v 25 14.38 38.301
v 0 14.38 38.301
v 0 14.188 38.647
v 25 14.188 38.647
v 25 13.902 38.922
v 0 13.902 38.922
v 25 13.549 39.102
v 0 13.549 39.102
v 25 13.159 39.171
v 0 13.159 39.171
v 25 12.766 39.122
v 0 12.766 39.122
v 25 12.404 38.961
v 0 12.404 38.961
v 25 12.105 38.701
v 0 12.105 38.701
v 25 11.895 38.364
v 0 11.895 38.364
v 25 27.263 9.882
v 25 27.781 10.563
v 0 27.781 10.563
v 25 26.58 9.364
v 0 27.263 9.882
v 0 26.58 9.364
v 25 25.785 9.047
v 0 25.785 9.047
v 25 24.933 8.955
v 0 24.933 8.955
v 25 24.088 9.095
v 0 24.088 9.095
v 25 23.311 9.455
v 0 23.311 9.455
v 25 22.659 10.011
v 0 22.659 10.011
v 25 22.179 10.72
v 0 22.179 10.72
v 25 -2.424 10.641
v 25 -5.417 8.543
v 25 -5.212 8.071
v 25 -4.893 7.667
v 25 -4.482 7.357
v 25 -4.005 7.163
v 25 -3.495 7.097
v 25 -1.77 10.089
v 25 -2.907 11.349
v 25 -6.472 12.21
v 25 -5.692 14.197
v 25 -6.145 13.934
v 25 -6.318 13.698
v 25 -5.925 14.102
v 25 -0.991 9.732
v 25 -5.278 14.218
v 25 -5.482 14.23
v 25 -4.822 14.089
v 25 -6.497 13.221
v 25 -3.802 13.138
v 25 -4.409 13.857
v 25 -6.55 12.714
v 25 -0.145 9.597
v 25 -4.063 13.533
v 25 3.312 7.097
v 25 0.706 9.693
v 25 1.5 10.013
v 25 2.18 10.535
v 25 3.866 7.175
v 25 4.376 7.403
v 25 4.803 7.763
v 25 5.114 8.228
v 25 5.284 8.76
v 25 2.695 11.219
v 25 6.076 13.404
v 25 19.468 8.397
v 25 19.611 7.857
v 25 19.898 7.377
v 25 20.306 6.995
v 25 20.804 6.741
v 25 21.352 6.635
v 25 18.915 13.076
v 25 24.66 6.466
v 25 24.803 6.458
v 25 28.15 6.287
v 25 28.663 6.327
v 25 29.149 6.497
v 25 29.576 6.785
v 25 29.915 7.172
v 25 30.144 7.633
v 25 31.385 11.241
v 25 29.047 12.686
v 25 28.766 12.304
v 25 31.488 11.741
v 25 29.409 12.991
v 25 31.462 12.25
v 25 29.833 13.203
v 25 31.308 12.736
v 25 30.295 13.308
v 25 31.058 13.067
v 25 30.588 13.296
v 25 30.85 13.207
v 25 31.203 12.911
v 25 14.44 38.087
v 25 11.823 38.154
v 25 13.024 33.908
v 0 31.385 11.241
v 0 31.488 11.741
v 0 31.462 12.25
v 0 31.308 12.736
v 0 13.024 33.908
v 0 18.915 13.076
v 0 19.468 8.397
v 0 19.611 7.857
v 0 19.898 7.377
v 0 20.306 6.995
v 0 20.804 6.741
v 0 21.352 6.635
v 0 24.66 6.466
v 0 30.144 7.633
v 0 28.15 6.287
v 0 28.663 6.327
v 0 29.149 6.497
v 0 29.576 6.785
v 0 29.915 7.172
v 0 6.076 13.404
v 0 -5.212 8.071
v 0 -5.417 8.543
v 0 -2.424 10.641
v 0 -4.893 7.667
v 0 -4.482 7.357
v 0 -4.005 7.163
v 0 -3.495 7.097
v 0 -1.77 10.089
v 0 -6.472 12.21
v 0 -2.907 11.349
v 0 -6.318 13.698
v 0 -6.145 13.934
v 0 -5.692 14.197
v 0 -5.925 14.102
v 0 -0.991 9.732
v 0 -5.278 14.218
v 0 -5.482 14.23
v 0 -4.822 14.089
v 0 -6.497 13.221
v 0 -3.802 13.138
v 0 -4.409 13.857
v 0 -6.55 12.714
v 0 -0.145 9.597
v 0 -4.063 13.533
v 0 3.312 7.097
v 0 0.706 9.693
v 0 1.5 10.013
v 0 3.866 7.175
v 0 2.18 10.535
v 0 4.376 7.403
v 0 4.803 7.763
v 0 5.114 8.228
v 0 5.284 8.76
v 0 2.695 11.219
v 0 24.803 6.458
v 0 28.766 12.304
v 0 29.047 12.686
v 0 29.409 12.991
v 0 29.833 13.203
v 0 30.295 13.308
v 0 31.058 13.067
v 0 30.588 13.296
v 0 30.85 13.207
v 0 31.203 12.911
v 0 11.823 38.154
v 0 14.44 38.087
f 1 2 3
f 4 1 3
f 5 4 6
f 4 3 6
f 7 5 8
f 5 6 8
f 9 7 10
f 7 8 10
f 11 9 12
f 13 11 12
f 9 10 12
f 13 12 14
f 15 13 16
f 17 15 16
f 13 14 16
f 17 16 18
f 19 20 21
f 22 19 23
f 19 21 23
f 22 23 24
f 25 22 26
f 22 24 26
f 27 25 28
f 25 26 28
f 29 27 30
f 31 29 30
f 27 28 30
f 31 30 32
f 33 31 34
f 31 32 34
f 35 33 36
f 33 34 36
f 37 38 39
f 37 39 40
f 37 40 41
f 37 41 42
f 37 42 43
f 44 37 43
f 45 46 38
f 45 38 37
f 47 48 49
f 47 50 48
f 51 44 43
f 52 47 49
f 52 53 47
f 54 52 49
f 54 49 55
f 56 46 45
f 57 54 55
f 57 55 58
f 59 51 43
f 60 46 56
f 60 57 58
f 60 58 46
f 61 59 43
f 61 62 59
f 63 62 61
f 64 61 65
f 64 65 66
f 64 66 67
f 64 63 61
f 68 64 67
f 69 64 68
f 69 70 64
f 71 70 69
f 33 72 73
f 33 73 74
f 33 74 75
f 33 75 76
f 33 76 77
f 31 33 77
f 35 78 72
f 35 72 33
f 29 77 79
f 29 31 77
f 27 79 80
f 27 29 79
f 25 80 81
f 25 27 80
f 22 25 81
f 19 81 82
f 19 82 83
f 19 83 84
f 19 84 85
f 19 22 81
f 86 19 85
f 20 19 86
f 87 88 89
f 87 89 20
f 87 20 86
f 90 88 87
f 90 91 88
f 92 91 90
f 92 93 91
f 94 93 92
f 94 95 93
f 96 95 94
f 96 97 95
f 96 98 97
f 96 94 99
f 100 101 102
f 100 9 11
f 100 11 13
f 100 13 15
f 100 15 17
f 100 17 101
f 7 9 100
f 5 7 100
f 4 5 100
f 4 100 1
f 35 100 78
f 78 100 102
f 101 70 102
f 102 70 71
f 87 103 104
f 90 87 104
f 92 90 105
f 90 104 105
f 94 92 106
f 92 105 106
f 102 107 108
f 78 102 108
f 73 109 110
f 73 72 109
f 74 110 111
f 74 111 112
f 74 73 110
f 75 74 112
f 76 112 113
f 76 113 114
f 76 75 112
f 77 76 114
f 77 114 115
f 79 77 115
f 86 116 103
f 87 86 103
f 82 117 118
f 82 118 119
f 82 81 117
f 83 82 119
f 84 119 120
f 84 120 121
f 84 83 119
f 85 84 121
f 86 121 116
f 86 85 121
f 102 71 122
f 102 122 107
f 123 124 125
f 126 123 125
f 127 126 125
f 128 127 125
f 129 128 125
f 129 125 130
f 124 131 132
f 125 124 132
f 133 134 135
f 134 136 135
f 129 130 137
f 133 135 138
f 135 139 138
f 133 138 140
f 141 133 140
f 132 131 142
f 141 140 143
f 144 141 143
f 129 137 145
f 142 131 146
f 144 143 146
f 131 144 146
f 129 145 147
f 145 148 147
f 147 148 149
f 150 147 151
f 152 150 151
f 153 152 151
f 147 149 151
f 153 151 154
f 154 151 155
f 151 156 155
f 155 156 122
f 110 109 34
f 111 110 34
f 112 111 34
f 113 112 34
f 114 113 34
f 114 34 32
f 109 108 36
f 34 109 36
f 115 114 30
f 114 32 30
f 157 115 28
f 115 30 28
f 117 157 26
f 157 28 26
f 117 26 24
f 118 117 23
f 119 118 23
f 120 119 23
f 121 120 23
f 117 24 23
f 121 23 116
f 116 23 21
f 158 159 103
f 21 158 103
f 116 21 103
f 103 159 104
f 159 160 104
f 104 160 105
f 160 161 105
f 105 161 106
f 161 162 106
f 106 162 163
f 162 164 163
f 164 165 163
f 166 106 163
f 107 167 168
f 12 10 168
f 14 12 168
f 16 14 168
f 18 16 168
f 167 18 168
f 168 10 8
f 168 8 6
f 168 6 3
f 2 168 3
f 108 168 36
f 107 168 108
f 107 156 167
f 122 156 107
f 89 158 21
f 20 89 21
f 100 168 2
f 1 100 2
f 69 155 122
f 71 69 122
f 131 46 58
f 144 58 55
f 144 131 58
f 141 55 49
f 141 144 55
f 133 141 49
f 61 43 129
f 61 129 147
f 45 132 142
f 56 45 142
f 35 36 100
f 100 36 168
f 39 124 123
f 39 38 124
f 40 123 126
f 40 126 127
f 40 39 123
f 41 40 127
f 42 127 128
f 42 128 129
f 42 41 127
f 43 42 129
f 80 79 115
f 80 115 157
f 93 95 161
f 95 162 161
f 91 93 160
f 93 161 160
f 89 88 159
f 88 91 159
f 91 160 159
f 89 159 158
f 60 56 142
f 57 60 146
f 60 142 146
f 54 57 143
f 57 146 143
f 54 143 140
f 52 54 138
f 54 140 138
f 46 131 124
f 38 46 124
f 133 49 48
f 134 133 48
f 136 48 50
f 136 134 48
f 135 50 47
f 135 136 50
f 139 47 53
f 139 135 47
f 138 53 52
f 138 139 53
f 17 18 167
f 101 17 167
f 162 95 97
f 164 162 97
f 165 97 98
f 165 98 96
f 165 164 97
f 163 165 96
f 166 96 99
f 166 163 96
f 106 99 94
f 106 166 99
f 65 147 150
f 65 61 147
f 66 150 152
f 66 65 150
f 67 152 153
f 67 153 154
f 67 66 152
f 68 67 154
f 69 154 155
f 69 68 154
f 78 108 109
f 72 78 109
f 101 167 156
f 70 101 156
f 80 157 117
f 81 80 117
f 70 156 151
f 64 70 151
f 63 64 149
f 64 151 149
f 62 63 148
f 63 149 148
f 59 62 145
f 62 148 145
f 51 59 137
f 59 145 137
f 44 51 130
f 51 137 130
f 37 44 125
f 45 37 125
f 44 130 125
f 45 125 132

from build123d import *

# Parameters (mm, degrees)
F1_DEPTH    = 25
F2_T1_DEPTH = 35
F2_T3_DEPTH = 33.3163528131
F3_R        = 1
F4_R        = 2


# Not quite as in the source:
# - a fillet or chamfer that OpenCascade refuses, or shapes differently, is made with other operations: its cross-section is extruded or revolved along the edge and cut away or added


with BuildPart() as f1:
    # F0 (on Right) → F1 (new body)
    with BuildSketch(Plane.YZ):
        with BuildLine():
            Line((-6.9323359057, 13.8083724305), (-5, 7.0966093383))
            Line((-5, 7.0966093383), (-0.1434815237, 7.0966093383))
            ThreePointArc((-0.1434815237, 7.0966093383), (-3.0832893136, 7.9619770163), (-5.1434815237, 10.2306636665))
            Line((-5.1434815237, 10.2306636665), (-6.9323359057, 13.8083724305))
        make_face()
        with BuildLine():
            ThreePointArc((-5.1434815237, 10.2306636665), (-3.0832893136, 7.9619770163), (-0.1434815237, 7.0966093383))
            Line((-0.1434815237, 7.0966093383), (0, 7.0966093383))
            ThreePointArc((0, 7.0966093383), (2.9398077898, 7.9619770163), (5, 10.2306636665))
            Line((5, 10.2306636665), (6.0755903162, 13.4044619593))
            Line((6.0755903162, 13.4044619593), (13.0241518458, 33.9079309741))
            Line((13.0241518458, 33.9079309741), (11.8234508953, 38.1539476614))
            Line((11.8234508953, 38.1539476614), (2.6952738362, 11.2189777838))
            ThreePointArc((2.6952738362, 11.2189777838), (-0.1451253509, 9.597004922), (-2.9074135462, 11.3486976553))
            Line((-2.9074135462, 11.3486976553), (-4.6962679282, 14.9264064193))
            Line((-4.6962679282, 14.9264064193), (-6.9323359057, 13.8083724305))
            Line((-6.9323359057, 13.8083724305), (-5.1434815237, 10.2306636665))
        make_face()
        with BuildLine():
            ThreePointArc((5, 10.2306636665), (2.9398077898, 7.9619770163), (0, 7.0966093383))
            Line((0, 7.0966093383), (5, 7.0966093383))
            Line((5, 7.0966093383), (6.0755903162, 13.4044619593))
            Line((6.0755903162, 13.4044619593), (5, 10.2306636665))
        make_face()
        with BuildLine():
            Line((11.8234508953, 38.1539476614), (13.0241518458, 33.9079309741))
            Line((13.0241518458, 33.9079309741), (14.4404213471, 38.0869884254))
            Line((14.4404213471, 38.0869884254), (14.3799488187, 38.3008363155))
            ThreePointArc((14.3799488187, 38.3008363155), (13.1588056017, 39.1706090028), (11.8947803947, 38.3644231928))
            Line((11.8947803947, 38.3644231928), (11.8234508953, 38.1539476614))
        make_face()
        with BuildLine():
            Line((14.4404213471, 38.0869884254), (13.0241518458, 33.9079309741))
            Line((13.0241518458, 33.9079309741), (18.9150818034, 13.075943714))
            Line((18.9150818034, 13.075943714), (19.8269579074, 9.8512930193))
            ThreePointArc((19.8269579074, 9.8512930193), (21.7684346268, 7.4802174812), (24.6601411506, 6.4656414912))
            Line((24.6601411506, 6.4656414912), (24.8034349308, 6.4583039016))
            ThreePointArc((24.8034349308, 6.4583039016), (27.7836505914, 7.1721986247), (29.9571668266, 9.332559297))
            Line((29.9571668266, 9.332559297), (31.9266431601, 12.8141053576))
            Line((31.9266431601, 12.8141053576), (29.7506768723, 14.045028066))
            Line((29.7506768723, 14.045028066), (27.7812005388, 10.5634820055))
            ThreePointArc((27.7812005388, 10.5634820055), (24.9329458702, 8.9553436878), (22.1792103708, 10.7204511366))
            Line((22.1792103708, 10.7204511366), (14.4404213471, 38.0869884254))
        make_face()
        with BuildLine():
            Line((19.8269579074, 9.8512930193), (18.9150818034, 13.075943714))
            Line((18.9150818034, 13.075943714), (19.6666835811, 6.7213395575))
            Line((19.6666835811, 6.7213395575), (24.6601411506, 6.4656414912))
            ThreePointArc((24.6601411506, 6.4656414912), (21.7684346268, 7.4802174812), (19.8269579074, 9.8512930193))
        make_face()
        with BuildLine():
            ThreePointArc((29.9571668266, 9.332559297), (27.7836505914, 7.1721986247), (24.8034349308, 6.4583039016))
            Line((24.8034349308, 6.4583039016), (29.6535987202, 6.2099434249))
            Line((29.6535987202, 6.2099434249), (31.9266431601, 12.8141053576))
            Line((31.9266431601, 12.8141053576), (29.9571668266, 9.332559297))
        make_face()
    extrude(amount=F1_DEPTH)

    # F2: fillet of radius 2 on 4 edges, made by hand

    # F2_s2 → F2_t1 (cut)
    with BuildSketch(Plane.YZ.offset(-5)):
        with BuildLine():
            ThreePointArc((-3.8018407372, 13.1375520373), (-4.9582395872, 14.1404914424), (-6.4851223102, 14.0319792283))
            Line((-6.4851223102, 14.0319792283), (-4.6962679282, 14.9264064193))
            Line((-4.6962679282, 14.9264064193), (-3.8018407372, 13.1375520373))
        make_face()
        with BuildLine():
            ThreePointArc((31.4914499025, 13.0602898993), (29.972114357, 13.2467443186), (28.7659387055, 12.3042550357))
            Line((28.7659387055, 12.3042550357), (29.7506768723, 14.045028066))
            Line((29.7506768723, 14.045028066), (31.4914499025, 13.0602898993))
        make_face()
    extrude(amount=F2_T1_DEPTH, mode=Mode.SUBTRACT)

    # F2_s4 → F2_t3 (cut)
    with BuildSketch(Plane.YZ.offset(-4.1581764065)):
        with BuildLine():
            ThreePointArc((-6.4721671557, 12.2100252573), (-6.3817440303, 13.5668302715), (-5.4446614885, 14.5522096391))
            Line((-5.4446614885, 14.5522096391), (-6.9323359057, 13.8083724305))
            Line((-6.9323359057, 13.8083724305), (-6.4721671557, 12.2100252573))
        make_face()
        with BuildLine():
            ThreePointArc((31.3853376782, 11.2413824514), (31.3644193539, 12.6010363088), (30.4789548914, 13.6330483599))
            Line((30.4789548914, 13.6330483599), (31.9266431601, 12.8141053576))
            Line((31.9266431601, 12.8141053576), (31.3853376782, 11.2413824514))
        make_face()
    extrude(amount=F2_T3_DEPTH, mode=Mode.SUBTRACT)

    # F3
    f3_edges = [f1.edges().sort_by_distance(p)[0] for p in [
        (12.5, -5.926233, 14.214777),
        (12.5, 30.942641, 13.27143),
    ]]
    fillet(f3_edges, radius=F3_R)

    # F4
    f4_edges = [f1.edges().sort_by_distance(p)[0] for p in [
        (12.5, -5, 7.096609),
        (12.5, 5, 7.096609),
        (12.5, 19.666684, 6.72134),
        (12.5, 29.653599, 6.209943),
    ]]
    fillet(f4_edges, radius=F4_R)


solid = f1.part
